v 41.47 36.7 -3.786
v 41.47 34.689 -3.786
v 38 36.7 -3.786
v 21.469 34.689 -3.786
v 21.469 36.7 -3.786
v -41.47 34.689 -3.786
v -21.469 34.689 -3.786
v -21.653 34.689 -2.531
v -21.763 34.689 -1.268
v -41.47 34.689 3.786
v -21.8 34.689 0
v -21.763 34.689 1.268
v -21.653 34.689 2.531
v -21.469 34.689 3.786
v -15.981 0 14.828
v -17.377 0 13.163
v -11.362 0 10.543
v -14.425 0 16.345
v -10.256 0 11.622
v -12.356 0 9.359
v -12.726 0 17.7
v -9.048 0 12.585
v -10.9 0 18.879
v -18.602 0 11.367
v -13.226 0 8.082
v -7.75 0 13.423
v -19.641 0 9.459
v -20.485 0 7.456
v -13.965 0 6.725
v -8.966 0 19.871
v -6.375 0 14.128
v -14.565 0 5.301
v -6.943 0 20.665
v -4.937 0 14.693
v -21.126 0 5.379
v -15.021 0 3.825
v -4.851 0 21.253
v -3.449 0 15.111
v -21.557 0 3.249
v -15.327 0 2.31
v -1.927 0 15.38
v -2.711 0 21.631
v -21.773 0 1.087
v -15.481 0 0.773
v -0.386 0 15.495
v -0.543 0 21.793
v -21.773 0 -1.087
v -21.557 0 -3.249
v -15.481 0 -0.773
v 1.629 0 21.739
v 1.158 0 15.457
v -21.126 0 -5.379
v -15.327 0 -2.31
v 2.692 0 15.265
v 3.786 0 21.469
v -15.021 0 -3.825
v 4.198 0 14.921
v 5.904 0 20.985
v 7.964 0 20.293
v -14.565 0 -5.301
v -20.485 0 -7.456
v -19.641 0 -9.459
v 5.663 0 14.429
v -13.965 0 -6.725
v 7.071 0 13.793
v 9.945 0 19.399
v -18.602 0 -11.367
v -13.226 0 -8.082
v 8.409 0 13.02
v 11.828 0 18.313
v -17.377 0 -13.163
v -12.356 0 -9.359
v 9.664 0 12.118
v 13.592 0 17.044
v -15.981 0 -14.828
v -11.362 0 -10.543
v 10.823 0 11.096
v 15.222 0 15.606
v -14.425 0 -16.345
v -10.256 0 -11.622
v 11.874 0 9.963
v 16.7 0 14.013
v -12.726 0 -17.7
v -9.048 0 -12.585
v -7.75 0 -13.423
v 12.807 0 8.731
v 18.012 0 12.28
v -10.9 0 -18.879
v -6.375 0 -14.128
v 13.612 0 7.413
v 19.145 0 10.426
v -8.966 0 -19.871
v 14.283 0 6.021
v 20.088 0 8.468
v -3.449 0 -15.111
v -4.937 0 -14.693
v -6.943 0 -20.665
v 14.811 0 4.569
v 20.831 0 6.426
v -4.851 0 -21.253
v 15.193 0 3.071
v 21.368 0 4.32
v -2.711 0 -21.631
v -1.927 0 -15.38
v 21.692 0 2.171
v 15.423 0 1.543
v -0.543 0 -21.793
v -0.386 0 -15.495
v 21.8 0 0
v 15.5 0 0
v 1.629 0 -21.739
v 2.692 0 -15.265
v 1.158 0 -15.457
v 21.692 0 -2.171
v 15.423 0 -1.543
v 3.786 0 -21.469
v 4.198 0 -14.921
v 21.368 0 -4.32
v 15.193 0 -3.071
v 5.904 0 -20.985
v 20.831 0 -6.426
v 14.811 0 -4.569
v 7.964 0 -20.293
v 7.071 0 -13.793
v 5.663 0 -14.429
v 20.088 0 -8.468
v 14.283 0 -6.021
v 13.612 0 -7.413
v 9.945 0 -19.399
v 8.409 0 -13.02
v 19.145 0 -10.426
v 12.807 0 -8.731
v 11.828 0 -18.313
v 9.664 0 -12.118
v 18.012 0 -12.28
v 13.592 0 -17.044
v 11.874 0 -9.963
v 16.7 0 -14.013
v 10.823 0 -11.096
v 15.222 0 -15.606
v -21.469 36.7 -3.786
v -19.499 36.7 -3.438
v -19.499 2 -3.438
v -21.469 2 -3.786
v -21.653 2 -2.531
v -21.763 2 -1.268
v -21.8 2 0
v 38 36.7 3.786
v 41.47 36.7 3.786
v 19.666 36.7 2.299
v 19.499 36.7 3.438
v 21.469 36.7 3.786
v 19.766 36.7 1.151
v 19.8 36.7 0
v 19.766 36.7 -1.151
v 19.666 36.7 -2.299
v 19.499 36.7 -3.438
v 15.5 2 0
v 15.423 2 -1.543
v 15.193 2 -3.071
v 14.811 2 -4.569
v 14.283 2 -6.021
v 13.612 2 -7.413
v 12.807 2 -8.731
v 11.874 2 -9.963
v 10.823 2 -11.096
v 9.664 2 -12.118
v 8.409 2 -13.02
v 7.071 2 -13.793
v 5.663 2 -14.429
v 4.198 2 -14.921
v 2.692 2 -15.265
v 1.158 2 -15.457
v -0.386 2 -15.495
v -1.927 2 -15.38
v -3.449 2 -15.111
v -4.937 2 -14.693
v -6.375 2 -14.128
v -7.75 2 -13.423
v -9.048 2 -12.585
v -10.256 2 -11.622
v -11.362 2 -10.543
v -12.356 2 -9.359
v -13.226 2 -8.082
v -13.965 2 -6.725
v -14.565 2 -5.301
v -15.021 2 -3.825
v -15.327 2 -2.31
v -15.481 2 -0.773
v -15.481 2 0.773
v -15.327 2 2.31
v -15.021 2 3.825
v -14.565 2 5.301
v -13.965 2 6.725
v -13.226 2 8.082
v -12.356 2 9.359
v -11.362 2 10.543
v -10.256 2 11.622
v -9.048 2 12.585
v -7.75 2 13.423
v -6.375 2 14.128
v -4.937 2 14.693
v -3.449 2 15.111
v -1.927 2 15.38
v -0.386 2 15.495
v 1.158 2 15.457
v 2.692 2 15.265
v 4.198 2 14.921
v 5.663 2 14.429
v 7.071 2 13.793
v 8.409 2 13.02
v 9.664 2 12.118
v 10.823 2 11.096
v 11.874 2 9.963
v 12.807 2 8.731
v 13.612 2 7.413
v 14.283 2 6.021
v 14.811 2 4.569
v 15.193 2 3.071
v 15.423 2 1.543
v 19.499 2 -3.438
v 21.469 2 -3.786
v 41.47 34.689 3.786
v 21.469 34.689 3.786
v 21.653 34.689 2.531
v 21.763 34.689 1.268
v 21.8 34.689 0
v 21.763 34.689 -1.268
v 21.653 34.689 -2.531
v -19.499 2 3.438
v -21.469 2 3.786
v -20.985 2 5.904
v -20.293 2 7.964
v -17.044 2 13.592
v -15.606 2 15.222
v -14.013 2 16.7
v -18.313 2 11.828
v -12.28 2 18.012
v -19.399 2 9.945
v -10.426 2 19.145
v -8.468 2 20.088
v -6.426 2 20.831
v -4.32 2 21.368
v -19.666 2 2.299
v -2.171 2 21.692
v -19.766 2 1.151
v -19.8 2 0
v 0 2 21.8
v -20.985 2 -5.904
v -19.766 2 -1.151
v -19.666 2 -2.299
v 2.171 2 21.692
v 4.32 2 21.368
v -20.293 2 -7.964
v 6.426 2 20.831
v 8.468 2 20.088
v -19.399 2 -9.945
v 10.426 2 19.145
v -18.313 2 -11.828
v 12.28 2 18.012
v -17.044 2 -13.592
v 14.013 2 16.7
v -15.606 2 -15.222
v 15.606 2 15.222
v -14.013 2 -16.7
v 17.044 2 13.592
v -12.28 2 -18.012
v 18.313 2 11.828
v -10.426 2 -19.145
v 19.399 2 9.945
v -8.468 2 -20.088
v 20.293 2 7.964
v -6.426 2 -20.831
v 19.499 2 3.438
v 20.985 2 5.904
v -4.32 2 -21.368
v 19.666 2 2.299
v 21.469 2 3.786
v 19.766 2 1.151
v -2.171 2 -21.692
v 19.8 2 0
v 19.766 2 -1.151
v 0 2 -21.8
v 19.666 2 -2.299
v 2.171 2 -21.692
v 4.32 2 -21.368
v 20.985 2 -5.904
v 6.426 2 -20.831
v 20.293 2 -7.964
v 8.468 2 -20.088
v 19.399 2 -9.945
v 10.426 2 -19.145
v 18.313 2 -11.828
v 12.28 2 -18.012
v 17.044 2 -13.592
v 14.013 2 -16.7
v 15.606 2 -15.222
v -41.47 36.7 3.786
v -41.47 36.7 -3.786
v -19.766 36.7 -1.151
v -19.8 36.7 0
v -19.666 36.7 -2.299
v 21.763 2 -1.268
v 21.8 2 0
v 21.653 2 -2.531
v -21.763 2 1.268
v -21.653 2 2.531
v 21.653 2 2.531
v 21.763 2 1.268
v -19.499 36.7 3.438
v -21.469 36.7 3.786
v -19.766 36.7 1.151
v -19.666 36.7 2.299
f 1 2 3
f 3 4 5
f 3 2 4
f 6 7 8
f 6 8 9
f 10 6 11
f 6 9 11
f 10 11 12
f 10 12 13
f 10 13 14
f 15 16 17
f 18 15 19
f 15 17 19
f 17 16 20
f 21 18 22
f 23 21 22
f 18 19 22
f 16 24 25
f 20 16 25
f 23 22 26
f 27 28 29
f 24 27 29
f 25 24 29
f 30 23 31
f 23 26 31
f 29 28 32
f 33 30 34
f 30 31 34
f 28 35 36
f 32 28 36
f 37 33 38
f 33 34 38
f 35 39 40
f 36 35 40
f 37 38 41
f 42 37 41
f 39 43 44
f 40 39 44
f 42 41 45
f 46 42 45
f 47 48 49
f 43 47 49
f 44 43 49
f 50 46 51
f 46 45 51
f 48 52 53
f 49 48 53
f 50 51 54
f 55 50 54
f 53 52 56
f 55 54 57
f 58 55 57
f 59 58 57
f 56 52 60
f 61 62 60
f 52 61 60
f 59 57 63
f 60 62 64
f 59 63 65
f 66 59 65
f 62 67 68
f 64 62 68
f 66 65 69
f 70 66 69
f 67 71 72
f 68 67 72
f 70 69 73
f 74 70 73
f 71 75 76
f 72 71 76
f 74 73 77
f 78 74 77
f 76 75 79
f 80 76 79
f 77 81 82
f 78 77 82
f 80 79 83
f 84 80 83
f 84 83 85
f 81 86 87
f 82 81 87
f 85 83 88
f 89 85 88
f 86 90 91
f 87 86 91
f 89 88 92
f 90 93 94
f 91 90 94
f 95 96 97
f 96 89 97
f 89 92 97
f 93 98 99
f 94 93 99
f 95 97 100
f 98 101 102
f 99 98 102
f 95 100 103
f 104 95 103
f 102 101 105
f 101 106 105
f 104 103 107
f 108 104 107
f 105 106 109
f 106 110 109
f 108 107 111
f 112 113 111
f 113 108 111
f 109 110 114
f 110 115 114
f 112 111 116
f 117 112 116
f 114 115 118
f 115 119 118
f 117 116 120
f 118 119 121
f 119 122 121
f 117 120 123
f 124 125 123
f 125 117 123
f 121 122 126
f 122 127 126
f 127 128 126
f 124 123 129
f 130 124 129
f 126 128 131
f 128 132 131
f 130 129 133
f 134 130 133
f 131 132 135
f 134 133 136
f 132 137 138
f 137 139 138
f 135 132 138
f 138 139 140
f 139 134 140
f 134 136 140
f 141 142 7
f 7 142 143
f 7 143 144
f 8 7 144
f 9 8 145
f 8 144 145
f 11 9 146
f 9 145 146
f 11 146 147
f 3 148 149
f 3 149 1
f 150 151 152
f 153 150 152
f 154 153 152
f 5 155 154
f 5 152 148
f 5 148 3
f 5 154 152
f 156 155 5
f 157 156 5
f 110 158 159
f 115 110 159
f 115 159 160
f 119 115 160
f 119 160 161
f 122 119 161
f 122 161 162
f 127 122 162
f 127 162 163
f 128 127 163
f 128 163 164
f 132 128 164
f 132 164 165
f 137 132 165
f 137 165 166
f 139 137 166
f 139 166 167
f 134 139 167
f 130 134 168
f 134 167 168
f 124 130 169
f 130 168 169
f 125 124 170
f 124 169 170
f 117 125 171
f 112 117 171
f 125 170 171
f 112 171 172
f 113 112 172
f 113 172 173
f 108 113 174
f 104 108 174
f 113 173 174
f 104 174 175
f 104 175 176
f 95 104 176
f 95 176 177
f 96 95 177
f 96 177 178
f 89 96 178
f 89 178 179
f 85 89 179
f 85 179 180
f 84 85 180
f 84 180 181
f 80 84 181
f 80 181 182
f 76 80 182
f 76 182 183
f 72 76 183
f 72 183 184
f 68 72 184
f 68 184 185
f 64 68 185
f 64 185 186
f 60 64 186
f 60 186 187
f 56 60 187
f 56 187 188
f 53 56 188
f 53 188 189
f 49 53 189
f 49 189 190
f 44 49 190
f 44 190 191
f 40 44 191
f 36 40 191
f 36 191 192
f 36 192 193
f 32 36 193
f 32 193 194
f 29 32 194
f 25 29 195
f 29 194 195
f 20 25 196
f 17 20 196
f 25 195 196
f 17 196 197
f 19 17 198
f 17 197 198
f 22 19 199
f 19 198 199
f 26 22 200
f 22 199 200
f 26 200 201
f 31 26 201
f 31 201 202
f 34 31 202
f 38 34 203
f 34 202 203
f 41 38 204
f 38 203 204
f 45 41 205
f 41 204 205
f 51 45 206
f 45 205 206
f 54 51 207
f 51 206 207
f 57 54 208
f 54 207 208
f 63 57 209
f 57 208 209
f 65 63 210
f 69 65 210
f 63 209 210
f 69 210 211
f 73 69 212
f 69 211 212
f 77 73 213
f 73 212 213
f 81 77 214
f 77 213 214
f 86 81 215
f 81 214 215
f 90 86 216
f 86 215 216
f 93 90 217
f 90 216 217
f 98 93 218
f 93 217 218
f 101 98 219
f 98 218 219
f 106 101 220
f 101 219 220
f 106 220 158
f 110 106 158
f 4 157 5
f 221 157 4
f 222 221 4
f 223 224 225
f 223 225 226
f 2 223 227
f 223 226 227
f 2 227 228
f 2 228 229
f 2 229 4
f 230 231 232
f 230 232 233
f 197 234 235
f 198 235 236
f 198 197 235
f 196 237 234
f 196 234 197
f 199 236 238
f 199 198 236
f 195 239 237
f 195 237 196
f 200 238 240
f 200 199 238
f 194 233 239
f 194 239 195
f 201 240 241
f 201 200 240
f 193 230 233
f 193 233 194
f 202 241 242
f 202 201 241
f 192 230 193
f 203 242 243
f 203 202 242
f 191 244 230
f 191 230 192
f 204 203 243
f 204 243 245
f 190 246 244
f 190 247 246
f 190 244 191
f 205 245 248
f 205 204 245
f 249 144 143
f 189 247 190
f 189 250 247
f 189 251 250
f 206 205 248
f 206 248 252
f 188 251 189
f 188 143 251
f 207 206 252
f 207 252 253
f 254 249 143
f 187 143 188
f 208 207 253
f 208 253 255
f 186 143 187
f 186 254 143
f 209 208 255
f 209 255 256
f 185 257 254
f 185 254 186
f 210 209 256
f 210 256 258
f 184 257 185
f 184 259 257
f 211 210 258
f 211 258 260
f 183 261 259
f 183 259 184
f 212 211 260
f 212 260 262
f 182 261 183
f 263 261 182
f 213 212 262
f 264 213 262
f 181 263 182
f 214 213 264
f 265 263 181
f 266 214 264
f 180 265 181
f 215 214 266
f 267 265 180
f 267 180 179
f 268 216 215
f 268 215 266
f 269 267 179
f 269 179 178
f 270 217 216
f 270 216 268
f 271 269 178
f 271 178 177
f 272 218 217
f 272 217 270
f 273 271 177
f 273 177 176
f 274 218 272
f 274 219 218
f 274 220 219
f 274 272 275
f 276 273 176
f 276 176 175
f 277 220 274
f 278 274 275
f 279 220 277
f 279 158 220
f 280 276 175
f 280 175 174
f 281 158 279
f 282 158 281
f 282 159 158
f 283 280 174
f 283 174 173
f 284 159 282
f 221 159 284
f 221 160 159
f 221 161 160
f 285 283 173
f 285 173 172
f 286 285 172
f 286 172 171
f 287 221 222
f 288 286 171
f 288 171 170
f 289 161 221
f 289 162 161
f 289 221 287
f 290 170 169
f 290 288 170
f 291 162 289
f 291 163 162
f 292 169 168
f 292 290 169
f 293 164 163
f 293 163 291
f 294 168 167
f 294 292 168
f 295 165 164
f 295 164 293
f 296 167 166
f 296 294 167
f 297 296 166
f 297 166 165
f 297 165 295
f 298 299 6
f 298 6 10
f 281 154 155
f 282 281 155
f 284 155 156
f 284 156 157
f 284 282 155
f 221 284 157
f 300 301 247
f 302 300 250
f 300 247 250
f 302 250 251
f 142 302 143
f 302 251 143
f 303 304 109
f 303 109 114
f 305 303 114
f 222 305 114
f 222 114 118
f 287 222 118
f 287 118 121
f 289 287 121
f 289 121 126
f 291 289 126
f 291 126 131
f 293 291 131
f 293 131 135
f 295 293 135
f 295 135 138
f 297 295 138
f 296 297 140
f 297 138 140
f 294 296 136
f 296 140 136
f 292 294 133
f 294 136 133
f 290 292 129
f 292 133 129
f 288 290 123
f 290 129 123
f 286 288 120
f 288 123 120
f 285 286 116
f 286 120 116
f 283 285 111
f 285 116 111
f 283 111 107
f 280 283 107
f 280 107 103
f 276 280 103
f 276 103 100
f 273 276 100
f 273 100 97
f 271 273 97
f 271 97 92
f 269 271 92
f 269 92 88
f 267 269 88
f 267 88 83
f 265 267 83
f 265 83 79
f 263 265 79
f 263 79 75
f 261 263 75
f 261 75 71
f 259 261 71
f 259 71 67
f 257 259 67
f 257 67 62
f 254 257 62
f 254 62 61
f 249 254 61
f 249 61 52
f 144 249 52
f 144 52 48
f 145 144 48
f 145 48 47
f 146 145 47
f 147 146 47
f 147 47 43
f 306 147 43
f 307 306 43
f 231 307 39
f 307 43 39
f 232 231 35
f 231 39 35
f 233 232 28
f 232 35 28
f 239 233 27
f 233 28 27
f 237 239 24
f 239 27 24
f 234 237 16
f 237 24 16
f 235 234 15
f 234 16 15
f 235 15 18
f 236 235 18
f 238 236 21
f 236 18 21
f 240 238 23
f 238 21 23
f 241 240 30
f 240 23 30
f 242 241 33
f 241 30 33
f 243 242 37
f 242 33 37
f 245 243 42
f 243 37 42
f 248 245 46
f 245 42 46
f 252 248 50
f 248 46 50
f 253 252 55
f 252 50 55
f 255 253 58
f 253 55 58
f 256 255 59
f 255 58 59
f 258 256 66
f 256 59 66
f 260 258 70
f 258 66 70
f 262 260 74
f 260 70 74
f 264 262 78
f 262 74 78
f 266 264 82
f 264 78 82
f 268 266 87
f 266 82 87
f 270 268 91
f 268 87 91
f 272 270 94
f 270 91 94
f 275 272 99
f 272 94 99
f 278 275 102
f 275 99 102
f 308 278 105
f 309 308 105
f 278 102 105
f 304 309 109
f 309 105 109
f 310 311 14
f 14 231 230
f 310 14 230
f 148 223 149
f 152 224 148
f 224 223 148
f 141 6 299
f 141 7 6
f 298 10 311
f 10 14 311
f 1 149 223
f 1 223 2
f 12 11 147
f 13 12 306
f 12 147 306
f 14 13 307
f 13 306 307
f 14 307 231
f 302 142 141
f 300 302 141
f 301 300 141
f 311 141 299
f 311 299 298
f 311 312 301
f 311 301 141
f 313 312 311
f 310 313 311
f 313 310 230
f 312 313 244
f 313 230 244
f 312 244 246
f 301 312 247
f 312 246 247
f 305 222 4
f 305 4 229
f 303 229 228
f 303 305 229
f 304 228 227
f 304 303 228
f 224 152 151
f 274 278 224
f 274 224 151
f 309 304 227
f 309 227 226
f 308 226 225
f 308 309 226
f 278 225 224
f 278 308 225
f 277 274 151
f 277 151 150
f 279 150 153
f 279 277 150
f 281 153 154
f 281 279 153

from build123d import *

# Parameters (mm, degrees)
SKETCH1_R           = 21.8
BOSS_EXTRUDE1_DEPTH = 2
SKETCH2_R           = 15.5
CUT_EXTRUDE1_DEPTH  = 16
BOSS_EXTRUDE2_DEPTH = 34.7
BOSS_EXTRUDE3_START = 21.468809
SKETCH4_W           = 7.571060546
SKETCH4_H           = 2.011077307
BOSS_EXTRUDE3_DEPTH = 13.531191
SKETCH5_W           = 7.571060546
SKETCH5_H           = 2.011077307
BOSS_EXTRUDE4_DEPTH = 3
SKETCH6_W           = 7.571060546
SKETCH6_H           = 2.011077307
BOSS_EXTRUDE5_DEPTH = 3.47
BOSS_EXTRUDE6_START = -35
SKETCH7_W           = 7.571060546
SKETCH7_H           = 2.011077307
BOSS_EXTRUDE6_DEPTH = 13.531191
SKETCH8_W           = 7.571060546
SKETCH8_H           = 2.011077307
BOSS_EXTRUDE7_DEPTH = 6.47


with BuildPart() as part:
    # Sketch1 → Boss-Extrude1 (new body)
    with BuildSketch(Plane(origin=(0, 0, 0), x_dir=(1, 0, 0), z_dir=(0, 1, 0))):
        Circle(SKETCH1_R)
    extrude(amount=BOSS_EXTRUDE1_DEPTH)

    # Sketch2 → Cut-Extrude1 (cut)
    with BuildSketch(Plane(origin=(0, 2, 0), x_dir=(1, 0, 0), z_dir=(0, 1, 0))):
        Circle(SKETCH2_R)
    extrude(amount=-CUT_EXTRUDE1_DEPTH, mode=Mode.SUBTRACT)

    # Sketch3 → Boss-Extrude2 (add)
    with BuildSketch(Plane(origin=(0, 2, 0), x_dir=(1, 0, 0), z_dir=(0, 1, 0))):
        with BuildLine():
            Line((-19.499166961, 3.438229237), (-21.468809016, 3.785530273))
            ThreePointArc((-21.468809016, 3.785530273), (-21.717044418, 1.899995192), (-21.8, 0))
            ThreePointArc((-21.8, 0), (-21.717044418, -1.899995192), (-21.468809016, -3.785530273))
            Line((-21.468809016, -3.785530273), (-19.499166961, -3.438229237))
            ThreePointArc((-19.499166961, -3.438229237), (-19.724628167, -1.725681357), (-19.799973042, 0))
            ThreePointArc((-19.799973042, 0), (-19.724628167, 1.725681357), (-19.499166961, 3.438229237))
        make_face()
        with BuildLine():
            Line((21.468809016, -3.785530273), (19.499001497, -3.438200061))
            ThreePointArc((19.499001497, -3.438200061), (19.72446079, -1.725666713), (19.799805025, 0))
            ThreePointArc((19.799805025, 0), (19.72446079, 1.725666713), (19.499001497, 3.438200061))
            Line((19.499001497, 3.438200061), (21.468809016, 3.785530273))
            ThreePointArc((21.468809016, 3.785530273), (21.717044418, 1.899995192), (21.8, 0))
            ThreePointArc((21.8, 0), (21.717044418, -1.899995192), (21.468809016, -3.785530273))
        make_face()
    extrude(amount=BOSS_EXTRUDE2_DEPTH)

    # Sketch4 → Boss-Extrude3 (add)
    with BuildSketch(Plane(origin=(0, 0, 0), x_dir=(0, 0, -1), z_dir=(1, 0, 0)).offset(BOSS_EXTRUDE3_START)):
        with Locations((0, 35.694461347)):
            Rectangle(SKETCH4_W, SKETCH4_H)
    extrude(amount=BOSS_EXTRUDE3_DEPTH)

    # Sketch5 → Boss-Extrude4 (add)
    with BuildSketch(Plane(origin=(35, 0, 0), x_dir=(0, 0, -1), z_dir=(1, 0, 0))):
        with Locations((0, 35.694461347)):
            Rectangle(SKETCH5_W, SKETCH5_H)
    extrude(amount=BOSS_EXTRUDE4_DEPTH)

    # Sketch6 → Boss-Extrude5 (add)
    with BuildSketch(Plane(origin=(38, 0, 0), x_dir=(0, 0, -1), z_dir=(1, 0, 0))):
        with Locations((0, 35.694461347)):
            Rectangle(SKETCH6_W, SKETCH6_H)
    extrude(amount=BOSS_EXTRUDE5_DEPTH)

    # Sketch7 → Boss-Extrude6 (add)
    with BuildSketch(Plane(origin=(0, 0, 0), x_dir=(0, 0, -1), z_dir=(1, 0, 0)).offset(BOSS_EXTRUDE6_START)):
        with Locations((0, 35.694461347)):
            Rectangle(SKETCH7_W, SKETCH7_H)
    extrude(amount=BOSS_EXTRUDE6_DEPTH)

    # Sketch8 → Boss-Extrude7 (add)
    with BuildSketch(Plane(origin=(-35, 34.688922693, 3.785530273), x_dir=(0, 0, 1), z_dir=(-1, 0, 0))):
        with Locations((-3.785530273, 1.005538654)):
            Rectangle(SKETCH8_W, SKETCH8_H)
    extrude(amount=BOSS_EXTRUDE7_DEPTH)


solid = part.part
